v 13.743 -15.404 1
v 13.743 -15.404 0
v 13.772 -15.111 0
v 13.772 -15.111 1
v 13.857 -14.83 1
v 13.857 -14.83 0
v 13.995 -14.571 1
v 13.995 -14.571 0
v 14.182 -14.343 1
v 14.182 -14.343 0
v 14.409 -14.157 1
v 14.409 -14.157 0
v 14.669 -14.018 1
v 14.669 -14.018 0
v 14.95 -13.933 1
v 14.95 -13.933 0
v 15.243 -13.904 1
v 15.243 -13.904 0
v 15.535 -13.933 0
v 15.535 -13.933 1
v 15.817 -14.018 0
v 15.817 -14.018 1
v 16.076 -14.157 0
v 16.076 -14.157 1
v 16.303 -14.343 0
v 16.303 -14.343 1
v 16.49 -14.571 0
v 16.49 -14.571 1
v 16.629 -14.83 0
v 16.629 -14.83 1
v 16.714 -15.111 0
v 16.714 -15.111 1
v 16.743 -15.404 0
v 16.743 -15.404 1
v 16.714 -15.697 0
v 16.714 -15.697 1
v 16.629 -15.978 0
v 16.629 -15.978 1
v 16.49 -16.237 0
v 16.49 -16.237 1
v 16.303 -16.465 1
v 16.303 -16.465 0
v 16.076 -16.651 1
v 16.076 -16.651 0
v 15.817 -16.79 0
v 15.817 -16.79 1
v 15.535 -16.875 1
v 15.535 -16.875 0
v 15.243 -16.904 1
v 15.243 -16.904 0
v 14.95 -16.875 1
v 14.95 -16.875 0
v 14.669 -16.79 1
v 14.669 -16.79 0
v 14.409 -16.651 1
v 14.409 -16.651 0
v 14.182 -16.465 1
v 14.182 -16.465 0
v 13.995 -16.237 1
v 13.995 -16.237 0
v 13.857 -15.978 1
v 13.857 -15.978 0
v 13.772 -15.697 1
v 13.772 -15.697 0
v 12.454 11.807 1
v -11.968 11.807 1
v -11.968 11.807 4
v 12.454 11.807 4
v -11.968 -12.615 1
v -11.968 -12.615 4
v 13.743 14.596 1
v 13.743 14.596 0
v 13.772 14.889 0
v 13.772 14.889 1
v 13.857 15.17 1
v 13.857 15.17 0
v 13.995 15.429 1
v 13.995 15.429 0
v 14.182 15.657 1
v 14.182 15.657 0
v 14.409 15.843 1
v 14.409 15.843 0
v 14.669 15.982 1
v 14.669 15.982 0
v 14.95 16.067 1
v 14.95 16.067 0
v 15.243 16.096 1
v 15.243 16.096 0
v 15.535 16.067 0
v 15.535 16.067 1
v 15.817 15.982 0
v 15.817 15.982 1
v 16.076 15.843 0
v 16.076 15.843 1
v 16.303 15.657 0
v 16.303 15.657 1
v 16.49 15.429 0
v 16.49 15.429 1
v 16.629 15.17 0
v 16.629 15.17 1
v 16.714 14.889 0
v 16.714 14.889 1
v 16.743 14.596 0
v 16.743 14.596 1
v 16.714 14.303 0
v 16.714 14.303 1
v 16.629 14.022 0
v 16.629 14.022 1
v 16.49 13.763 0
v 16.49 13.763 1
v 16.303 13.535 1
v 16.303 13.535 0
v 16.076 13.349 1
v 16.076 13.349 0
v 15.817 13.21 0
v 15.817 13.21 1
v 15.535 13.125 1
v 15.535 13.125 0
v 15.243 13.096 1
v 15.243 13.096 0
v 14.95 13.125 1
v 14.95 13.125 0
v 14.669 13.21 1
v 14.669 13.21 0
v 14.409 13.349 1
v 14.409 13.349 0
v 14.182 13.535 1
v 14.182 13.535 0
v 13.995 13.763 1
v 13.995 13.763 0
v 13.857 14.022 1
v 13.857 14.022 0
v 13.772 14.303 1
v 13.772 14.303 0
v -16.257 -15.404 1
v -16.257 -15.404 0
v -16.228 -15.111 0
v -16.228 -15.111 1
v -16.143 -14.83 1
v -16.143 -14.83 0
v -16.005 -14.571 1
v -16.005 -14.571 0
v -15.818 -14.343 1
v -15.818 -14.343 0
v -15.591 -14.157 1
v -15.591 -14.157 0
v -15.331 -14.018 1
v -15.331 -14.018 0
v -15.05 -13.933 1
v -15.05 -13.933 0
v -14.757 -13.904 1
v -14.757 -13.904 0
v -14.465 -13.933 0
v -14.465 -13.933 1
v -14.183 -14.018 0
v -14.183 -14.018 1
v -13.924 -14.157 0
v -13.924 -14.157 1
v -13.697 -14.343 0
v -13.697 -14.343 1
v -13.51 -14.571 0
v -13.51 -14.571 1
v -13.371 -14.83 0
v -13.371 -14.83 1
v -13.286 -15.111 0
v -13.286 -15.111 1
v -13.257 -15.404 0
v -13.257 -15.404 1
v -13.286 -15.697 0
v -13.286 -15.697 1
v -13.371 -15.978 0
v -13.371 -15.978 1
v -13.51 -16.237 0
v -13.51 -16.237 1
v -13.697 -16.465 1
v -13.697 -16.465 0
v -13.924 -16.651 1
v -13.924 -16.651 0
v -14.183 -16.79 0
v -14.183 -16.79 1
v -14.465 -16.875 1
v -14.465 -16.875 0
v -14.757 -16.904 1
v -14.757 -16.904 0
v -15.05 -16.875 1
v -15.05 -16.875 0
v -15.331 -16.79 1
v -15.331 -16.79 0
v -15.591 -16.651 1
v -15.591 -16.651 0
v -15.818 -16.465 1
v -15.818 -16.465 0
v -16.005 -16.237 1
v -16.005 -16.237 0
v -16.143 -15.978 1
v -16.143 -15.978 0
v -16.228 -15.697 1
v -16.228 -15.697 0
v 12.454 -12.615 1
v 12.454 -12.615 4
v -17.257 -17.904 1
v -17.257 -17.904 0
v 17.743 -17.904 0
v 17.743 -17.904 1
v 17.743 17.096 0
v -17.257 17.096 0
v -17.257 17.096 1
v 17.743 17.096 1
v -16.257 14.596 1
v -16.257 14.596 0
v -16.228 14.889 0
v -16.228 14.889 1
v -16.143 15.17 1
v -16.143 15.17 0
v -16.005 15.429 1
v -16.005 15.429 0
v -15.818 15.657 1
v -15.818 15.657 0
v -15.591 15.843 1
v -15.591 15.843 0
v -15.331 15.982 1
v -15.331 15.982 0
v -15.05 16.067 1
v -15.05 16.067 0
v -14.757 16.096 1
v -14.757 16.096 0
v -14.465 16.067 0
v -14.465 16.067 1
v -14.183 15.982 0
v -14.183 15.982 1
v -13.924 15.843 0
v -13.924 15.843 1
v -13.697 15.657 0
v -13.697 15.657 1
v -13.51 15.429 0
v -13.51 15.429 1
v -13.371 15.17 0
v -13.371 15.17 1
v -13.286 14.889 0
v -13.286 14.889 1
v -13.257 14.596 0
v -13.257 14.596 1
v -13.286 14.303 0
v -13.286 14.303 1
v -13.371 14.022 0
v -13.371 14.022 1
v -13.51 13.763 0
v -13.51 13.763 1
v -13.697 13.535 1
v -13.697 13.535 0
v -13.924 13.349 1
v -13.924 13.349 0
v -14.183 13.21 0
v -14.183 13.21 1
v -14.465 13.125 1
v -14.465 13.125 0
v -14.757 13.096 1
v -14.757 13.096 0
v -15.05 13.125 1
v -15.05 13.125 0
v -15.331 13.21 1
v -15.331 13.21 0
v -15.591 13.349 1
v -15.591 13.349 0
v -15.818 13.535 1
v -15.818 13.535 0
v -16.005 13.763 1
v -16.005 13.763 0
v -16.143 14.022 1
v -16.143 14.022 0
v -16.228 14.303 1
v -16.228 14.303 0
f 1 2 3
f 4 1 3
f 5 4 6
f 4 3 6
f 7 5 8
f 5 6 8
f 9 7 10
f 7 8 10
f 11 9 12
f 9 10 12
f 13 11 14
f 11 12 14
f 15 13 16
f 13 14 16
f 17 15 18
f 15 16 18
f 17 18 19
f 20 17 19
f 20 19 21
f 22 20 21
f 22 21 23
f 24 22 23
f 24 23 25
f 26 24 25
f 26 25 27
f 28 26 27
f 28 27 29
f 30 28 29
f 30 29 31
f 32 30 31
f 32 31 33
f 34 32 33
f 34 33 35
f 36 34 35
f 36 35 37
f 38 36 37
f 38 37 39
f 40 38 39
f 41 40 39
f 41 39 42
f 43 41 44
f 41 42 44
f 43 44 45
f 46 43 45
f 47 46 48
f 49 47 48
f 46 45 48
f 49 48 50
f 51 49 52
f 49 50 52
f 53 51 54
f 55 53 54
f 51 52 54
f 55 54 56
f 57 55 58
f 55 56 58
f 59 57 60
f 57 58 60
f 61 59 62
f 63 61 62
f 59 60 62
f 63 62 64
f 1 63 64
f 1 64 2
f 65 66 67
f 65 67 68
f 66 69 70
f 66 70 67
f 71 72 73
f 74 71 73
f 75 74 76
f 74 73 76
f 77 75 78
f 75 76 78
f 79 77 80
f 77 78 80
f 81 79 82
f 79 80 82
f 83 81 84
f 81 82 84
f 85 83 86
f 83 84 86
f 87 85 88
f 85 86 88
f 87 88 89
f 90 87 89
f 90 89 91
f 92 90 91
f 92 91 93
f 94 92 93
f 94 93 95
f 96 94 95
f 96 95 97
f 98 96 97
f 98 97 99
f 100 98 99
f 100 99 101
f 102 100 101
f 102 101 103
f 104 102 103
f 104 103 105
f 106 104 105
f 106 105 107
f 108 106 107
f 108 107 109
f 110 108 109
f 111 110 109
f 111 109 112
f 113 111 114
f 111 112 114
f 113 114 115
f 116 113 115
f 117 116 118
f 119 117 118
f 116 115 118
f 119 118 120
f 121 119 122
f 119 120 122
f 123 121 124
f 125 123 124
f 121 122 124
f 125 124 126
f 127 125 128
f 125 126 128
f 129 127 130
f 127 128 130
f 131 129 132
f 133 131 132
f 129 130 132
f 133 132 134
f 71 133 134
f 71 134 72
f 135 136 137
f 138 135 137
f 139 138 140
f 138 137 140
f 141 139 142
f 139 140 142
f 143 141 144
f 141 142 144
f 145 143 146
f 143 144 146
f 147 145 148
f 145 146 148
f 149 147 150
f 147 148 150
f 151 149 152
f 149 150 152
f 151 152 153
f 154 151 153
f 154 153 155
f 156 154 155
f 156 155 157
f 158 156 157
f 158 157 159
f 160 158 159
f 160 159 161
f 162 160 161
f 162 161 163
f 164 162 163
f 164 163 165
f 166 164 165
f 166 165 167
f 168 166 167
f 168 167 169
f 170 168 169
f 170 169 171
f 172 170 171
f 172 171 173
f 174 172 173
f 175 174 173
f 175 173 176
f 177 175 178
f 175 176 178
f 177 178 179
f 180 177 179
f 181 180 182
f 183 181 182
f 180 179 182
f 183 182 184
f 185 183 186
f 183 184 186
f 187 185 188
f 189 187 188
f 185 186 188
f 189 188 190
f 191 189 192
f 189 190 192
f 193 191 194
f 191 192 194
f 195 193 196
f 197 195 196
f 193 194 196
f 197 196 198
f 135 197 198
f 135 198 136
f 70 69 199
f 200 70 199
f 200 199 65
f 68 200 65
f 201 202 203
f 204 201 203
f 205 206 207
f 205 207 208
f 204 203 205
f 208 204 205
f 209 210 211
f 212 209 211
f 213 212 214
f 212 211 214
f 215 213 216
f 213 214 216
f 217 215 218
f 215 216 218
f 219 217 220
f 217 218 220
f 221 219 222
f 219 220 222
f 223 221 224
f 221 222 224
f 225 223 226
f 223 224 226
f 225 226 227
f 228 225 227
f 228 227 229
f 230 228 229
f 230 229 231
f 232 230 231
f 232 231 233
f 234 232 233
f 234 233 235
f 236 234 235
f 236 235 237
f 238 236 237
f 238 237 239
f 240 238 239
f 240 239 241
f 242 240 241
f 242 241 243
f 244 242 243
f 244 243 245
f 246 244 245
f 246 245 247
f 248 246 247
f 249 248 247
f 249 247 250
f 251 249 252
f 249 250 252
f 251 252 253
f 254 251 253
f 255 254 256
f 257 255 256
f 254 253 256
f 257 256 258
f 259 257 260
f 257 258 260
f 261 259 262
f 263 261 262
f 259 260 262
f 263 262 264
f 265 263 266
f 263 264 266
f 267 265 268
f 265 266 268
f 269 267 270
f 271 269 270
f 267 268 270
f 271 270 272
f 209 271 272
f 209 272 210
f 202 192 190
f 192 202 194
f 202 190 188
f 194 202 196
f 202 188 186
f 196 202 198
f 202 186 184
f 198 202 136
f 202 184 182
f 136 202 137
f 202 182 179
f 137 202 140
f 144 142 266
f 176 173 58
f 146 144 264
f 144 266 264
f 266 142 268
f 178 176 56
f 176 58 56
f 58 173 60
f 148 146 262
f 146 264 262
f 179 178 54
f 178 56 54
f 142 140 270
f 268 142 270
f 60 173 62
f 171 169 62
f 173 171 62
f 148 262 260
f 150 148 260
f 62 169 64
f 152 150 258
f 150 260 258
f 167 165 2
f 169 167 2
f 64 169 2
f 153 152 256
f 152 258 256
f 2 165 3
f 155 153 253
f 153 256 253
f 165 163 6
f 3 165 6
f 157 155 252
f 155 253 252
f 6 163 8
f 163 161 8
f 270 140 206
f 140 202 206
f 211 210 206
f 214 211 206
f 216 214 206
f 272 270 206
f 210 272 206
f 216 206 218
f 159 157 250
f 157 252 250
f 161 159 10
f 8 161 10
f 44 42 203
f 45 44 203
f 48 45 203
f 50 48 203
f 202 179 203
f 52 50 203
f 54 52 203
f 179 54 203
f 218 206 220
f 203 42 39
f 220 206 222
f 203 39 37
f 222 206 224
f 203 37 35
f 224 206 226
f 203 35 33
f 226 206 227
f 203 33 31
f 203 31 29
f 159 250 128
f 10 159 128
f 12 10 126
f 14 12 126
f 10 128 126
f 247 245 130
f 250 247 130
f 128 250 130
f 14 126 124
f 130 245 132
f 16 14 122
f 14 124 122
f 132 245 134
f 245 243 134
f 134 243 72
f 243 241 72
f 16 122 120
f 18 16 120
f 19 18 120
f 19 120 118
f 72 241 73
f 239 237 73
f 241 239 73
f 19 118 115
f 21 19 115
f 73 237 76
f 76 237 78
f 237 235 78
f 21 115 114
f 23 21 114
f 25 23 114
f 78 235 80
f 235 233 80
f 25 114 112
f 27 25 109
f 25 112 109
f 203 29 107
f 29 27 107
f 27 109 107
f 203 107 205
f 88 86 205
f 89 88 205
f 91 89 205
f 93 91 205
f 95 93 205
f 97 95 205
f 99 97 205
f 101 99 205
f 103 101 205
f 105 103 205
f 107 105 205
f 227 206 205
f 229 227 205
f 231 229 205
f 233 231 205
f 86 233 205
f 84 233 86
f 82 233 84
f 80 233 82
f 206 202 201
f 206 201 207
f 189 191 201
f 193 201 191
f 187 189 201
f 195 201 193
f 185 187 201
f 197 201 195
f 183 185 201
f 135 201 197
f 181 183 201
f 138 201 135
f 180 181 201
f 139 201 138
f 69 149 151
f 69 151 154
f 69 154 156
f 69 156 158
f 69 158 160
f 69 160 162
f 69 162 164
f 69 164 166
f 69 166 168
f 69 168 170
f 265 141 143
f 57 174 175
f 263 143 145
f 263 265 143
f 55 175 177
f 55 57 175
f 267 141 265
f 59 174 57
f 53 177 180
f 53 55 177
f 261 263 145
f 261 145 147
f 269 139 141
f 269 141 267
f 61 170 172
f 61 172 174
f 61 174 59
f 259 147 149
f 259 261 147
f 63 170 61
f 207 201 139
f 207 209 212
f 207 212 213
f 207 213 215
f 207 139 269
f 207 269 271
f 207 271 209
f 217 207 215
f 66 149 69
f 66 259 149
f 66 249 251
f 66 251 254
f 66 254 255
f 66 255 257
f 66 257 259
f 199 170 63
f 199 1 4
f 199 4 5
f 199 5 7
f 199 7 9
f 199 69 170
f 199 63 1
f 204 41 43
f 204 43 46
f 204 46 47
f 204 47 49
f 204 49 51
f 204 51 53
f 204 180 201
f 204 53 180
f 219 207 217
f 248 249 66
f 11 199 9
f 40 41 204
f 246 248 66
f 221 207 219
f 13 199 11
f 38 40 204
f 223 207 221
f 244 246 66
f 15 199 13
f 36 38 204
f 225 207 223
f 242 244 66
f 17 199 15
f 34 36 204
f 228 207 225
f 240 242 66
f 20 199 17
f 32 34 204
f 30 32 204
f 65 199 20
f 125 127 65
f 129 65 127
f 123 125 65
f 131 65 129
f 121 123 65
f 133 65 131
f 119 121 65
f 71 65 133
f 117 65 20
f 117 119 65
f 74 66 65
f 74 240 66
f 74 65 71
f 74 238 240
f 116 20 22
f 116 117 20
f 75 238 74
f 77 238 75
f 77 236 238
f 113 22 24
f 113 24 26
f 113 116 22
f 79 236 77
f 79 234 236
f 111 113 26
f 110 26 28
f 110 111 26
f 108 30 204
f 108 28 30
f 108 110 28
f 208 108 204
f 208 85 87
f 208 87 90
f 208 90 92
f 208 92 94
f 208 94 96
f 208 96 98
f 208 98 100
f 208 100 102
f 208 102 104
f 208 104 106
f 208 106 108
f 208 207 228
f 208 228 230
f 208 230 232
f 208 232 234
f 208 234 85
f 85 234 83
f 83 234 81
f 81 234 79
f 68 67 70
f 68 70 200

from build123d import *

# Parameters (mm, degrees)
F0_W     = 35
F0_H     = 35
F1_DEPTH = 1
F3_D     = 3
F4_W     = 24.421909
F4_H     = 24.421909
F5_DEPTH = 3


with BuildPart() as f1:
    # F0 (on Top) → F1 (new body)
    with BuildSketch(Plane.XY):
        with Locations((0.242682, -0.403982)):
            Rectangle(F0_W, F0_H)
    extrude(amount=F1_DEPTH)

    # F3 (through all)
    with Locations(Plane.XY.offset(1)):
        with Locations((-14.757318, 14.596018), (-14.757318, -15.403982), (15.242682, -15.403982), (15.242682, 14.596018)):
            Hole(F3_D / 2)

    # F4 (on face) → F5 (join)
    with BuildSketch(Plane.XY.offset(1)):
        with Locations((0.242682, -0.403982)):
            Rectangle(F4_W, F4_H)
    extrude(amount=F5_DEPTH)


solid = f1.part
